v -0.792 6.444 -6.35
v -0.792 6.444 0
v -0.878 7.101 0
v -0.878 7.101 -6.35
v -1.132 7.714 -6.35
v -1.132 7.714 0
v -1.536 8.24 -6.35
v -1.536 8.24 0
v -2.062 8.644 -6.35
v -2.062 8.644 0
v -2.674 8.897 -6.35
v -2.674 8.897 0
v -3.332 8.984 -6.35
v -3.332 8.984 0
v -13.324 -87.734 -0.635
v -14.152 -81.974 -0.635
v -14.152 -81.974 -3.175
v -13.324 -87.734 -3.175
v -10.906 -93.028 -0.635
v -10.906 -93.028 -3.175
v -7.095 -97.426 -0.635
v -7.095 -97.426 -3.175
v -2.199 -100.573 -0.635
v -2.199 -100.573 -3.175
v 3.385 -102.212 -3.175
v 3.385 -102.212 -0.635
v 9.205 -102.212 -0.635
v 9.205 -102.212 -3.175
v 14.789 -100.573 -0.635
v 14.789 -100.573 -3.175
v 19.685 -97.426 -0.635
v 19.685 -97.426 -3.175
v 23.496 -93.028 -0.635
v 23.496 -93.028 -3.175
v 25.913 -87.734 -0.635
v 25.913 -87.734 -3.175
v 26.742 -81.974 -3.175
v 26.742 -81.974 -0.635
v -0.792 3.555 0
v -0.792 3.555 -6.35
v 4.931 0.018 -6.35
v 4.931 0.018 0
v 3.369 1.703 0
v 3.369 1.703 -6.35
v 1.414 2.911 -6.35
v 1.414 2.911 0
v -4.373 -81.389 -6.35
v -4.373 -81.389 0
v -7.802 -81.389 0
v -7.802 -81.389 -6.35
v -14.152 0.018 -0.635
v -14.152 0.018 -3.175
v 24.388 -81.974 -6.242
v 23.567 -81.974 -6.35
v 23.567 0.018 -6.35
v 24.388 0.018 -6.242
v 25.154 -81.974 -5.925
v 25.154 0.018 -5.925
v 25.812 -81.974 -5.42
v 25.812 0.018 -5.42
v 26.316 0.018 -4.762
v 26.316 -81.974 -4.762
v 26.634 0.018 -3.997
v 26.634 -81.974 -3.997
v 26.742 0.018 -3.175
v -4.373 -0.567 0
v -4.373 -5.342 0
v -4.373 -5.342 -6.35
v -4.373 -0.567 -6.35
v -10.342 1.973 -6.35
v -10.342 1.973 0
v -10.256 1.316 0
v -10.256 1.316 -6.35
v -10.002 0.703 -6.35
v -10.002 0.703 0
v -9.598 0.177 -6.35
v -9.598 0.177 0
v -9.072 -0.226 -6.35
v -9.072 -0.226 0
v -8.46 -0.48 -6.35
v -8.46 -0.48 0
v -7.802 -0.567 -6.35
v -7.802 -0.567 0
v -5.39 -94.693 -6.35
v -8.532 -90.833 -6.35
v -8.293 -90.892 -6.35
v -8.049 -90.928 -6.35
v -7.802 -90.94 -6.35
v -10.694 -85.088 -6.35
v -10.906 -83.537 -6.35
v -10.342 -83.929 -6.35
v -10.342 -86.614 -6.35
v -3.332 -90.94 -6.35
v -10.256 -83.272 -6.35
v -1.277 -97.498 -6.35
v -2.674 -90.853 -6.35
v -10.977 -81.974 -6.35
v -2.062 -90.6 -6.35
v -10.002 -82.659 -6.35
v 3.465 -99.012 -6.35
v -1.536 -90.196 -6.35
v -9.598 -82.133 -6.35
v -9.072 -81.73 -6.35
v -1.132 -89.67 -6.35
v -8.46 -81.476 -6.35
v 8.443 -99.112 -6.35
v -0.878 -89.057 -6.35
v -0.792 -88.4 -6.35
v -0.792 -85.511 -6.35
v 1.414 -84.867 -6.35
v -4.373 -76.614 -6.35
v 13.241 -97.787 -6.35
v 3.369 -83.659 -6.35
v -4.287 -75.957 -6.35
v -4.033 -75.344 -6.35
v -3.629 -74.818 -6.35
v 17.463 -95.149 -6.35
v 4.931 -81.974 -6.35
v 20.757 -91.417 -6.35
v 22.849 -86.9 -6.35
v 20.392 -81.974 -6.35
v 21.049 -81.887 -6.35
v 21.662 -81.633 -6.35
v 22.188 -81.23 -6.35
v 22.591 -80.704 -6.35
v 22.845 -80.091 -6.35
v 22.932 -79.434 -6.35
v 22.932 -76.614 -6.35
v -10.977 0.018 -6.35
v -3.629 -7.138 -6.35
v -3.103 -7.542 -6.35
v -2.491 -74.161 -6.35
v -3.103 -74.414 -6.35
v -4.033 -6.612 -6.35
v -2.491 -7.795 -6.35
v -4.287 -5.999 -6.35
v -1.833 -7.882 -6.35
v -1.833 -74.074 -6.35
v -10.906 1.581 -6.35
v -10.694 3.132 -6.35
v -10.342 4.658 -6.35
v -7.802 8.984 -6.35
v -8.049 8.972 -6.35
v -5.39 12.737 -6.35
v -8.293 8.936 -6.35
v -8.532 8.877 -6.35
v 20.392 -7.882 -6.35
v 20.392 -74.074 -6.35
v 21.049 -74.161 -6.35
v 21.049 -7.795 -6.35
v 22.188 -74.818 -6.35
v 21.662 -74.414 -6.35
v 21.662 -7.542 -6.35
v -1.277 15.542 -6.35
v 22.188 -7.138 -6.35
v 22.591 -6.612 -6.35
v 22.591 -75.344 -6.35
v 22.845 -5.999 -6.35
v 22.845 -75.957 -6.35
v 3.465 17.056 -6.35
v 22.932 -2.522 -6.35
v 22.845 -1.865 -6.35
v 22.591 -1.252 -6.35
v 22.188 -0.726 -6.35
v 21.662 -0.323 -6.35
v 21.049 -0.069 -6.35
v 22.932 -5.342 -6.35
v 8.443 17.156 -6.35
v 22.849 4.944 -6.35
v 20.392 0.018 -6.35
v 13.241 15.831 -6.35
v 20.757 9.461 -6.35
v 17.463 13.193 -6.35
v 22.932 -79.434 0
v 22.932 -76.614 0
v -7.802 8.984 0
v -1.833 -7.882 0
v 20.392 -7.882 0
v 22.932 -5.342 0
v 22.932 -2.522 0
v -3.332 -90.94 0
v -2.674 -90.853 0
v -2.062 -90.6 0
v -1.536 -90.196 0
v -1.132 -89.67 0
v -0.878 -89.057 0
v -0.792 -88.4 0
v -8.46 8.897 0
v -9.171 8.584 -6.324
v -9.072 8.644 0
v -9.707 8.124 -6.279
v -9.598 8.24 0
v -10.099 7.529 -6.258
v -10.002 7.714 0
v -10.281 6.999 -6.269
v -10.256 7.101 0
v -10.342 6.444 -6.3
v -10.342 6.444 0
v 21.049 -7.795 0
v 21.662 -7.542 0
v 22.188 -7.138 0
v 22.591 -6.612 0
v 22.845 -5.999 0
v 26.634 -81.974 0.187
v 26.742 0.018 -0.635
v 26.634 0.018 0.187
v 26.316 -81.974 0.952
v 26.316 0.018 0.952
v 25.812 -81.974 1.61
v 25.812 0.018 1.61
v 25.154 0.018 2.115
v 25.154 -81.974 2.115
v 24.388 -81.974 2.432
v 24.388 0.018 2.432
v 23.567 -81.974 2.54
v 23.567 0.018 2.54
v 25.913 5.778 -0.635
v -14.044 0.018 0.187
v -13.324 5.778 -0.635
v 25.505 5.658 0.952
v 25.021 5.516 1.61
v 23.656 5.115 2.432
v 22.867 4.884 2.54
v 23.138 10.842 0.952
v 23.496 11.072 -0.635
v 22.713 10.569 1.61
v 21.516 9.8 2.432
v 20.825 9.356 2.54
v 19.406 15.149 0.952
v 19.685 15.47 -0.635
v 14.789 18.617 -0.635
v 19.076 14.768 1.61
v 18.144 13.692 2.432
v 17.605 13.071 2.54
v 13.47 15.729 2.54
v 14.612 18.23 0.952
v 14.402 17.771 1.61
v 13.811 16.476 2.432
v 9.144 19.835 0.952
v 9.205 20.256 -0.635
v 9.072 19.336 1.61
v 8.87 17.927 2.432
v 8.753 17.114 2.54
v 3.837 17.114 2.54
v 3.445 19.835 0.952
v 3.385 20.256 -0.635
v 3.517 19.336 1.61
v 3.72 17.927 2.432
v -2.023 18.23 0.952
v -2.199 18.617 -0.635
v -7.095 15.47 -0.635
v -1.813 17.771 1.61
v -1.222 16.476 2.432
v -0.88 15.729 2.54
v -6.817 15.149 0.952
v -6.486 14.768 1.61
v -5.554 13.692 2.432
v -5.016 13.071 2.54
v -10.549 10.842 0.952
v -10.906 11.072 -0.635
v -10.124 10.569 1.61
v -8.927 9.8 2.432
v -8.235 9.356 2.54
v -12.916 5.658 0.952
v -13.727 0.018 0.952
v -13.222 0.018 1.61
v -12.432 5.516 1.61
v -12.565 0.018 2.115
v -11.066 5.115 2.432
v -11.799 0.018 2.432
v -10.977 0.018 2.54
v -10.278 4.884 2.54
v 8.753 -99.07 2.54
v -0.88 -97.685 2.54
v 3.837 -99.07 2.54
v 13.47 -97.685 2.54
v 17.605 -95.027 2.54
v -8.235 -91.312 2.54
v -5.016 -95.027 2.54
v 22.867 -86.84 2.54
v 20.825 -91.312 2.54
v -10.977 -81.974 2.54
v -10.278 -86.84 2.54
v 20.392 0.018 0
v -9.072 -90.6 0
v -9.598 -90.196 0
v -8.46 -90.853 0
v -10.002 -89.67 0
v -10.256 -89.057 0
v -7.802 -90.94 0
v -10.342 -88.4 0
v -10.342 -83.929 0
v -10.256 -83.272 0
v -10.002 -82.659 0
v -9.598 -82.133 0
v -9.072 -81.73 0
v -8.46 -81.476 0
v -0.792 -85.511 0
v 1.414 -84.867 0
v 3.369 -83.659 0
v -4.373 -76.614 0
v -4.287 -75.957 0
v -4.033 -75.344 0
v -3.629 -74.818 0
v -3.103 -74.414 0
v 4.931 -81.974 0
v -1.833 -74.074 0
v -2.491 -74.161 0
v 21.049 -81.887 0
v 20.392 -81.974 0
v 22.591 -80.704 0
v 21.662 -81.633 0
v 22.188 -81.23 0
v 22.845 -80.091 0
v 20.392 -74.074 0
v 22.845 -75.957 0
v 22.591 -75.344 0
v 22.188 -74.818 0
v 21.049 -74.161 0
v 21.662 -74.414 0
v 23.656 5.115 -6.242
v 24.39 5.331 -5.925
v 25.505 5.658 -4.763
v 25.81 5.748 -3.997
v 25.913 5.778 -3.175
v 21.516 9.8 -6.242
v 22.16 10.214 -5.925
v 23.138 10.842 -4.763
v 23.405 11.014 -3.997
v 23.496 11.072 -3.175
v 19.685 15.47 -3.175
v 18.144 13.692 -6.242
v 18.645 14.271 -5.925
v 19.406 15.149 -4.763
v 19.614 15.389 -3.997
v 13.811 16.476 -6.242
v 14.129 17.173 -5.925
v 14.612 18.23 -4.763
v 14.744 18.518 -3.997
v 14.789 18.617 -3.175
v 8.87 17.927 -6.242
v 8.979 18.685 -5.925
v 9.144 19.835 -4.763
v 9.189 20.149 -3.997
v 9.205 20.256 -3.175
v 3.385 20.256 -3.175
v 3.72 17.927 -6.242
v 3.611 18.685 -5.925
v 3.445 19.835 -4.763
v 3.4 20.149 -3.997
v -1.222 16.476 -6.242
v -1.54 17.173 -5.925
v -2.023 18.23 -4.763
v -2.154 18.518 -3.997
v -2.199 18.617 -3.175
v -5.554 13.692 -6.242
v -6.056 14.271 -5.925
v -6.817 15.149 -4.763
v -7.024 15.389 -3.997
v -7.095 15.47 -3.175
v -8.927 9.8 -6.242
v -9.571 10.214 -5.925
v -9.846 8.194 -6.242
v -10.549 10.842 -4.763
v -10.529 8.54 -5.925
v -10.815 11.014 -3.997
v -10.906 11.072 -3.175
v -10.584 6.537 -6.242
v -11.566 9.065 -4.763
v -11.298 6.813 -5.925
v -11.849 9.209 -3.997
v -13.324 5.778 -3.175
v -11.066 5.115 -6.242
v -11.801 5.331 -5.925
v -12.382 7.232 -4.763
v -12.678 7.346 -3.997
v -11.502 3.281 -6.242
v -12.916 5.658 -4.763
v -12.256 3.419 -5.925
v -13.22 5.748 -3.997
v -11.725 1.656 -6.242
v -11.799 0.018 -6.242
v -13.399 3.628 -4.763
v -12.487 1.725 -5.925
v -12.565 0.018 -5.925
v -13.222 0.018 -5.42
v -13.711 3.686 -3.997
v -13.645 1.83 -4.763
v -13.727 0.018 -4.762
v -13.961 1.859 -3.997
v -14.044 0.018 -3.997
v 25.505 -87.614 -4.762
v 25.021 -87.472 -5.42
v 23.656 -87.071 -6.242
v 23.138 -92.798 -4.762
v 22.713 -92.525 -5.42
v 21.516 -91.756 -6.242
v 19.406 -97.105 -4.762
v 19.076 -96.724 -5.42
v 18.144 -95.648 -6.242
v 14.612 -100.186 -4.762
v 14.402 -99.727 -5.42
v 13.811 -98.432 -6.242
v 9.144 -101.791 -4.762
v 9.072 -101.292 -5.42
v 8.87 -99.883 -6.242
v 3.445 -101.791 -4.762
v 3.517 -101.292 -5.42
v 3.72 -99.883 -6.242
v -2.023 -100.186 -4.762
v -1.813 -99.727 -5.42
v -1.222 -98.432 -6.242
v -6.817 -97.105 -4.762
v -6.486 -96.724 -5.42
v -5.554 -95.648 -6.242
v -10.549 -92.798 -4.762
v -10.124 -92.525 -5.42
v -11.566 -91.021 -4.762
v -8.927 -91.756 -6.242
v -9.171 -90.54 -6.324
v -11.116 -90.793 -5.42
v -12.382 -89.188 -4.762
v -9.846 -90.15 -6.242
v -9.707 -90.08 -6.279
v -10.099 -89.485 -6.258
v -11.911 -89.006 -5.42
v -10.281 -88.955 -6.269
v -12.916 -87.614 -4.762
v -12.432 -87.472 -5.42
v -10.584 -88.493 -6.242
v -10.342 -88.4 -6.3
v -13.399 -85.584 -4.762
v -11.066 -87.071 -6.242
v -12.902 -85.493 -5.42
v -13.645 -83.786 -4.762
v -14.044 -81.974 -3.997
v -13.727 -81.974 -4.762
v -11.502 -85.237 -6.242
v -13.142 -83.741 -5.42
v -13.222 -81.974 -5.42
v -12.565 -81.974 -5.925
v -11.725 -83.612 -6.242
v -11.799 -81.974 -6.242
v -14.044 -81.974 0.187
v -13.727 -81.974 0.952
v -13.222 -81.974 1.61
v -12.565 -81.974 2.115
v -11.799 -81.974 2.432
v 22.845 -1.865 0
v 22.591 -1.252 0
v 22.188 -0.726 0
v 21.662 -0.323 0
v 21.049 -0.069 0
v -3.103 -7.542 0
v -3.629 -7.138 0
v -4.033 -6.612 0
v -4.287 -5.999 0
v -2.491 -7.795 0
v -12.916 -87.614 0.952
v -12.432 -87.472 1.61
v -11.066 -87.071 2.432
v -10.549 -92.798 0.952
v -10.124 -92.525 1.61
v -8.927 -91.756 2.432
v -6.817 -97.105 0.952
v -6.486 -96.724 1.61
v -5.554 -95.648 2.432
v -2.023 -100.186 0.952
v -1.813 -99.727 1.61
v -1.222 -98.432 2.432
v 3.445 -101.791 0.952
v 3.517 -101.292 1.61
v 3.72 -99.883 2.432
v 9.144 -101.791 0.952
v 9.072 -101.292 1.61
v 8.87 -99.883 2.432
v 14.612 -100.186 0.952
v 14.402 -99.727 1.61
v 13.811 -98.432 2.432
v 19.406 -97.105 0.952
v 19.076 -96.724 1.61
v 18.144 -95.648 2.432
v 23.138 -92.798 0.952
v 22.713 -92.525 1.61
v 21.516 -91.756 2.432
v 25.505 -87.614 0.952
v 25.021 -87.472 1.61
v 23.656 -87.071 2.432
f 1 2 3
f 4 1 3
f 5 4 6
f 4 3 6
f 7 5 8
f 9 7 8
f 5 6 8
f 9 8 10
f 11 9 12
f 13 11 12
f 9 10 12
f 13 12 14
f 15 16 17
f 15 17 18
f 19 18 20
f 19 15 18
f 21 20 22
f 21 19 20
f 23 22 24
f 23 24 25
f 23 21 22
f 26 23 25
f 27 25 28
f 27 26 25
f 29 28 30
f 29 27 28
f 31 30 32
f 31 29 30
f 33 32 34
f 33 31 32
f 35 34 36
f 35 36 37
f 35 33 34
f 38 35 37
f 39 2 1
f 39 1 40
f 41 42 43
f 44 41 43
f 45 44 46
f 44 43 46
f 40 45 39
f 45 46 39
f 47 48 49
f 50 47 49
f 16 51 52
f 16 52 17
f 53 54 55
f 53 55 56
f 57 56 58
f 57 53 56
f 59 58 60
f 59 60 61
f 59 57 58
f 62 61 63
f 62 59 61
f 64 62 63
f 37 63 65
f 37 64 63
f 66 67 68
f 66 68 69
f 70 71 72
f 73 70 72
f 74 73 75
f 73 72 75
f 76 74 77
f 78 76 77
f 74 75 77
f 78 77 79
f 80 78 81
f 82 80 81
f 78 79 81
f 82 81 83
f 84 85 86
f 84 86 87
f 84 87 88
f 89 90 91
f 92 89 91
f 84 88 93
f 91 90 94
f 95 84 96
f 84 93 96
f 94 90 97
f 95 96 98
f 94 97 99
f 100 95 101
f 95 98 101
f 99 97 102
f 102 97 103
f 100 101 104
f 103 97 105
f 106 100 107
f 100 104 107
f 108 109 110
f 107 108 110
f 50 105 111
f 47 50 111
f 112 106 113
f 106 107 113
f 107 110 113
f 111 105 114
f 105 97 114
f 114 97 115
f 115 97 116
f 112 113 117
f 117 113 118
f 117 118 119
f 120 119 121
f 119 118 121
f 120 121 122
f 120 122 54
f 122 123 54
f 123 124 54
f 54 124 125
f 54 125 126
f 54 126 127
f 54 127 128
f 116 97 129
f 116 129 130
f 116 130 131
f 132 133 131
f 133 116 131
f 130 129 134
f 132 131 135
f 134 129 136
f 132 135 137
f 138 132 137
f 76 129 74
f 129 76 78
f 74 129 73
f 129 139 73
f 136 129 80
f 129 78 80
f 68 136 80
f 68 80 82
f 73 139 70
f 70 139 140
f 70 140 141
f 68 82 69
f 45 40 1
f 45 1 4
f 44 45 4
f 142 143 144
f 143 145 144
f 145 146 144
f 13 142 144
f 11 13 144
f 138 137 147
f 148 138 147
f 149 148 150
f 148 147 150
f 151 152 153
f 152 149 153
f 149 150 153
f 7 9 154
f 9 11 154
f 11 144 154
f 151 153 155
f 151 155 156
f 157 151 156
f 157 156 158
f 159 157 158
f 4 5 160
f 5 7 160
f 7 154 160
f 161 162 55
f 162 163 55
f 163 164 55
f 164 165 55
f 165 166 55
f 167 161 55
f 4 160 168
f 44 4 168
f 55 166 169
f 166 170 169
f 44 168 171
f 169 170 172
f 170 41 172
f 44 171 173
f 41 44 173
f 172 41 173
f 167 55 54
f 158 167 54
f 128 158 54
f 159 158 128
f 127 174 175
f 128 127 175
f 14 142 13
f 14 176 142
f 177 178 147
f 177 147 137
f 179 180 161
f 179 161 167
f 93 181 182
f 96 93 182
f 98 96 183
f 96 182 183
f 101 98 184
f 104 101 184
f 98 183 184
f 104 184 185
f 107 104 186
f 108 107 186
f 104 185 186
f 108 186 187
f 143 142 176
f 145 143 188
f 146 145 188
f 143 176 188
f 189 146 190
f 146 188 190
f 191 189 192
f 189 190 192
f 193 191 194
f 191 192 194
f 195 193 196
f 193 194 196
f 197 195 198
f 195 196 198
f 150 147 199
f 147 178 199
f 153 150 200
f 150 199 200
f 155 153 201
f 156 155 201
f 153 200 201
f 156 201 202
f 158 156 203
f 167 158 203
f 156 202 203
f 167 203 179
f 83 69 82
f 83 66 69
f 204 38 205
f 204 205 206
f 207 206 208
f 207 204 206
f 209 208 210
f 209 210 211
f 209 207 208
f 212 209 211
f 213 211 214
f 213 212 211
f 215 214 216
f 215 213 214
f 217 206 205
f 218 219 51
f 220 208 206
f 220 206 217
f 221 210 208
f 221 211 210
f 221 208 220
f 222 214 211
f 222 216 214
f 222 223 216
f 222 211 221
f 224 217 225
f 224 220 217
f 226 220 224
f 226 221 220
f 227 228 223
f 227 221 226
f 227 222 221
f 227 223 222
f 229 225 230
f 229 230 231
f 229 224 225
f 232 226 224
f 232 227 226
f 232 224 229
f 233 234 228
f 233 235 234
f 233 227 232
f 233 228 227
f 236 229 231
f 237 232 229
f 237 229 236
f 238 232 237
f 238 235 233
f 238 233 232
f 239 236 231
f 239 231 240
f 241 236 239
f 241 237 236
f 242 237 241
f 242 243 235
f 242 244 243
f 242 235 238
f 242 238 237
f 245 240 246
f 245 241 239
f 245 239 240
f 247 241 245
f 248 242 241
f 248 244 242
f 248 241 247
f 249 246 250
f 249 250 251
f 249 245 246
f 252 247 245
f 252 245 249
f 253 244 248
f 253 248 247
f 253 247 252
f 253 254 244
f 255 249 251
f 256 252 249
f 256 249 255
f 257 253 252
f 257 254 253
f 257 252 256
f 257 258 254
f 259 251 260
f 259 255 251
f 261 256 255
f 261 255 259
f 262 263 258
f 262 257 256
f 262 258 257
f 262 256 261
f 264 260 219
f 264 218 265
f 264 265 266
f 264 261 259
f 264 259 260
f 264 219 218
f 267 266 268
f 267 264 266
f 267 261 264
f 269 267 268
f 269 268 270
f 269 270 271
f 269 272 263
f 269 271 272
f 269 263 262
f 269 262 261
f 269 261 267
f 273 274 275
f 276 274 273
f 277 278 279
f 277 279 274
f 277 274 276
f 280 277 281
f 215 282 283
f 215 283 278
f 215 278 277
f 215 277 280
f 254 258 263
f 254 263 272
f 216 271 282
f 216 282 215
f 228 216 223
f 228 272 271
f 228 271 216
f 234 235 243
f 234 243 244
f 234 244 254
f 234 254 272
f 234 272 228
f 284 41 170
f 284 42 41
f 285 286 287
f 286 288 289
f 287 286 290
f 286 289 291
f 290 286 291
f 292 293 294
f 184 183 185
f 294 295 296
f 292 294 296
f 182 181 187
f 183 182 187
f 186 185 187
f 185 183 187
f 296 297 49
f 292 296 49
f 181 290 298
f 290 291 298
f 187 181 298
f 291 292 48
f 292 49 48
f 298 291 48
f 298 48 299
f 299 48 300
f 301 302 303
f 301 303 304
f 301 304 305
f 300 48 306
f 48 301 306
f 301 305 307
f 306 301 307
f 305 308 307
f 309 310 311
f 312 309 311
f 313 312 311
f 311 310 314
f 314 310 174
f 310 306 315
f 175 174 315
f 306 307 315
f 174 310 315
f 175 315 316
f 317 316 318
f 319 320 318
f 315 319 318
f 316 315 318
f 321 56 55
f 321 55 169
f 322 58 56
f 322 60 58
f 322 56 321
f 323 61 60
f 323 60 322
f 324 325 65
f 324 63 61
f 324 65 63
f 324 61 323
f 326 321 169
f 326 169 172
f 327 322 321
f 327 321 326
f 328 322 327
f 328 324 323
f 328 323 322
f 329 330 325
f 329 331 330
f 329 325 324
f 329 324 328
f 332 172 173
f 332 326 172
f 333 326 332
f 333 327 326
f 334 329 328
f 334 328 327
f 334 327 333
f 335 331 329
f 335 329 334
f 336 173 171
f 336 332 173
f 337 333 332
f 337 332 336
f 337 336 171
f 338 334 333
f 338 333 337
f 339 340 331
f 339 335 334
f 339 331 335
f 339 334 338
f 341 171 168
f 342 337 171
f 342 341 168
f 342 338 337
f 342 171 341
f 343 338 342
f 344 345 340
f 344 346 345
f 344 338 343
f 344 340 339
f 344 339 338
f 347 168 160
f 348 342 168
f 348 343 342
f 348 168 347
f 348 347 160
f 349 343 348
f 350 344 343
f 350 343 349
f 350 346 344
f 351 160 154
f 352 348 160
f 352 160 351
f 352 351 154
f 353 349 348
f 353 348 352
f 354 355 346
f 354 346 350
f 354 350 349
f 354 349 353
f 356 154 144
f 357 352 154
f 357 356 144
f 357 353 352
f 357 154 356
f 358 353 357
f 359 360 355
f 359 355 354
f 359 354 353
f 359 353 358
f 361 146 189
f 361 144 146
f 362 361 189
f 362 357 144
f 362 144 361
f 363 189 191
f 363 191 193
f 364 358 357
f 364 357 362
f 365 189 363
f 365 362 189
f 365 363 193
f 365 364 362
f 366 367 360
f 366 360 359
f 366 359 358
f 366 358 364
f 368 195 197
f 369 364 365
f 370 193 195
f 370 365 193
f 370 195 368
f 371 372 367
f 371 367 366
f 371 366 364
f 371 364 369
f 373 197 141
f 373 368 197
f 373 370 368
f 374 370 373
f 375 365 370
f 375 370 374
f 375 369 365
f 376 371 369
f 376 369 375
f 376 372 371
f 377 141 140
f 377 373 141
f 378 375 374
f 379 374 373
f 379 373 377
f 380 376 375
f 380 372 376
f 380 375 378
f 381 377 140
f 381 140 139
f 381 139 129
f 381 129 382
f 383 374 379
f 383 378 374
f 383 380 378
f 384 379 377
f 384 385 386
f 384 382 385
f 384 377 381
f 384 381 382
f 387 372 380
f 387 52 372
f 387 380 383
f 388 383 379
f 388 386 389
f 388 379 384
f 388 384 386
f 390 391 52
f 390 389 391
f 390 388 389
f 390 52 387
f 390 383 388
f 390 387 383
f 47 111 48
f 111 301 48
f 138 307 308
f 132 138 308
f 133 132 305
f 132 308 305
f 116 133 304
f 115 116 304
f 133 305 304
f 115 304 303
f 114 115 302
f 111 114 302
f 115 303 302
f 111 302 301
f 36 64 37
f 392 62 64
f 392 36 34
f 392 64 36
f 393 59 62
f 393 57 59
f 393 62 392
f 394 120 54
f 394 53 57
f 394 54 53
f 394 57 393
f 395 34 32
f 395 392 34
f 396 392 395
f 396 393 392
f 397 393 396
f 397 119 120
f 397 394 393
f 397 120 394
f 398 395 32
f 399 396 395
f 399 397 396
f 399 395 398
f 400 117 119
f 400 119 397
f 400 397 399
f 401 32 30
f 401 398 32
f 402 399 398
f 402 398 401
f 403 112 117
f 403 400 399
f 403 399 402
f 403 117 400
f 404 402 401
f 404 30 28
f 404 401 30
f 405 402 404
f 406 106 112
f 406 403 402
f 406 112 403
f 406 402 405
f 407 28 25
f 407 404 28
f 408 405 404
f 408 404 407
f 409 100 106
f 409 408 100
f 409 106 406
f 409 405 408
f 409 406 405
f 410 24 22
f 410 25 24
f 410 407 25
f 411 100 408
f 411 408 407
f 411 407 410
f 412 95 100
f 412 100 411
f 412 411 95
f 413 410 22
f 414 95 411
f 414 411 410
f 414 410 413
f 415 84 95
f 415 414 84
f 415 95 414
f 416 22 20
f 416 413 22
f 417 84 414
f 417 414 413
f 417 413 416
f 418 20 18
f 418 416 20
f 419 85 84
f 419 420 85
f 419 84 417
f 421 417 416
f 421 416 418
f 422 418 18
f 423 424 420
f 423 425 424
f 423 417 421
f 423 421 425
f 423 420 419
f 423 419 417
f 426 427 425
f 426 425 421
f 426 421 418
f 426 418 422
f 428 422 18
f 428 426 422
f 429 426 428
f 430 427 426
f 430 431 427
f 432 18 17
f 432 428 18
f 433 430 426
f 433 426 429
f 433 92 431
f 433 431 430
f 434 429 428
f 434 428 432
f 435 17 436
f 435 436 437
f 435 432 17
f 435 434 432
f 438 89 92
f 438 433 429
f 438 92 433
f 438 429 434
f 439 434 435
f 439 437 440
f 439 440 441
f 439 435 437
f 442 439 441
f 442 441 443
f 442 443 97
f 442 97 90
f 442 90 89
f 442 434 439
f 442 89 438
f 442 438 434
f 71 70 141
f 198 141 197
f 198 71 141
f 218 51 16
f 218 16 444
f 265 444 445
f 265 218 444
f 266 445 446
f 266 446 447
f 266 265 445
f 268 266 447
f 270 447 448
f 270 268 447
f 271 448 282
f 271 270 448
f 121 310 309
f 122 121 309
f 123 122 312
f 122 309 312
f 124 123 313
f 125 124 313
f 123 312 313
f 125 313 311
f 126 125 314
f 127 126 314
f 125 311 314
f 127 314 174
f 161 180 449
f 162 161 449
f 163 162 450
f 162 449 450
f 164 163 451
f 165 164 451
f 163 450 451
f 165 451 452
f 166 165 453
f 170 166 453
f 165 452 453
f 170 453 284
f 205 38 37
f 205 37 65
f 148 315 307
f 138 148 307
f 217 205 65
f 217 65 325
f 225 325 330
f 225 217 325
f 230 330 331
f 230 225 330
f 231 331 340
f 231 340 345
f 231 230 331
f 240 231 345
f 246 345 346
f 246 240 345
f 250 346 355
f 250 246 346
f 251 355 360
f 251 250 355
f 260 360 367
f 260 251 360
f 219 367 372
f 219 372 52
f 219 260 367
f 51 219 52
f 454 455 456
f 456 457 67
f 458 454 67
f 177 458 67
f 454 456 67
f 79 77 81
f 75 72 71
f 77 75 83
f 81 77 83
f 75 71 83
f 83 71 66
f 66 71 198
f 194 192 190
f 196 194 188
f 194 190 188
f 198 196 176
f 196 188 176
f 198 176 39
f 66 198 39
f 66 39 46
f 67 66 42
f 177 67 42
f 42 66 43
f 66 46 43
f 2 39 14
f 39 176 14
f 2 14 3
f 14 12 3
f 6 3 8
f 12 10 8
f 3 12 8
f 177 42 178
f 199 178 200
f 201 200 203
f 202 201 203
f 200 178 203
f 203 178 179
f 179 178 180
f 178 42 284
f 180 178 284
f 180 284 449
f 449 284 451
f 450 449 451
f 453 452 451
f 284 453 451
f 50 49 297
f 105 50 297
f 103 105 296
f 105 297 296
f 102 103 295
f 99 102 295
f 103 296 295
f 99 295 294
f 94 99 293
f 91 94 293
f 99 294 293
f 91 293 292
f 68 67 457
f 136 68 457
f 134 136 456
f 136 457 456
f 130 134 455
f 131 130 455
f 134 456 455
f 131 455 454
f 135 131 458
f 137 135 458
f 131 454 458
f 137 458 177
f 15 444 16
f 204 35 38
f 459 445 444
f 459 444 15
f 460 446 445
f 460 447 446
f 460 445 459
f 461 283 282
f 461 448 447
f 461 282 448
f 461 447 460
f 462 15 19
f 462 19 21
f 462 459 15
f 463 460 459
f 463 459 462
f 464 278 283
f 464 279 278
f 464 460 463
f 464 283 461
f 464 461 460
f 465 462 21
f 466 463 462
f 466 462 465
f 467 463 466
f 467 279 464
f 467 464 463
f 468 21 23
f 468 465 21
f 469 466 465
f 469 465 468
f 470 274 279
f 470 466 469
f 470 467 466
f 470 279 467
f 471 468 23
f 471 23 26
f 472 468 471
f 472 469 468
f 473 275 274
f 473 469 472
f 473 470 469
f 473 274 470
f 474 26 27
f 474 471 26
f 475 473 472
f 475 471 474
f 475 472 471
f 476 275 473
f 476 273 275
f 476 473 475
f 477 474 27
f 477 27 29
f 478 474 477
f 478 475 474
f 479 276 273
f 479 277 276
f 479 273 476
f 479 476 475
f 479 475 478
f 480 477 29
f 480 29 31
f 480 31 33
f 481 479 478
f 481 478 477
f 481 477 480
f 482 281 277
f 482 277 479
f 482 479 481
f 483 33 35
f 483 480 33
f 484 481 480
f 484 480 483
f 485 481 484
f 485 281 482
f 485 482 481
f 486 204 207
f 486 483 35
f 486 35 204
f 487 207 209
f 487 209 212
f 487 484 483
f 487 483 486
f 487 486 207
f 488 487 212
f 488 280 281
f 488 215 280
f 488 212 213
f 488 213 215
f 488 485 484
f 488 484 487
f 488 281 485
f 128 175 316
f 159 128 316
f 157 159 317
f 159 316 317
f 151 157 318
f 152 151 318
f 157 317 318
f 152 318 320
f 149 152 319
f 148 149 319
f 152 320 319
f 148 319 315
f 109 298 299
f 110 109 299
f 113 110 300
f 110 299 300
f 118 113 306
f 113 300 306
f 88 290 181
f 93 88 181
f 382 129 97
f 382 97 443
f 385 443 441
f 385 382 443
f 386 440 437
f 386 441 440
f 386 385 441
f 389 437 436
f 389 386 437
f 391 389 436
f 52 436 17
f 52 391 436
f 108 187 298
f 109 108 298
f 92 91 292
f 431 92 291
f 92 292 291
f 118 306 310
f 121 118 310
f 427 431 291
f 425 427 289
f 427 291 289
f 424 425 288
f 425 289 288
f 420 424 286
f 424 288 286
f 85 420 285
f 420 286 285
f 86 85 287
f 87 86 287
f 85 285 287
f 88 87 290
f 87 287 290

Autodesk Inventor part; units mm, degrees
ref_plane "YZ Plane" through (0, 0, 0) normal (1, 0, 0) x (0, 1, 0)
ref_plane "XZ Plane" through (0, 0, 0) normal (0, 1, 0) x (-1, 0, 0)
ref_plane "XY Plane" through (0, 0, 0) normal (0, 0, 1) x (1, 0, 0)
ref_plane "Work Plane1" through (0, 0, 0) normal (0, 0, 1) x (1, 0, 0)
sketch "Sketch1" plane through (0, 0, 0) normal (0, 0, 1) x (1, 0, 0)
  arc A0 (20.3917, -80.7036) -> (21.6617, -79.4336) centre (20.3917, -79.4336) ccw projected
  line L0 (21.6617, -79.4336) -> (21.6617, -76.6142) projected
  arc A1 (21.6617, -76.6142) -> (20.3917, -75.3442) centre (20.3917, -76.6142) ccw projected
  line L1 (20.3917, -75.3442) -> (-1.8333, -75.3442) projected
  arc A2 (-1.8333, -75.3442) -> (-3.1033, -76.6142) centre (-1.8333, -76.6142) ccw projected
  line L2 (-3.1033, -76.6142) -> (-3.1033, -81.3894) projected
  arc A3 (-4.3733, -82.6594) -> (-3.1033, -81.3894) centre (-4.3733, -81.3894) ccw projected
  line L3 (-4.3733, -82.6594) -> (-7.8023, -82.6594) projected
  arc A4 (-7.8023, -82.6594) -> (-9.0723, -83.9294) centre (-7.8023, -83.9294) ccw projected
  line L4 (-9.0723, -83.9294) -> (-9.0723, -88.3998) projected
  arc A5 (-9.0723, -88.3998) -> (-7.8023, -89.6698) centre (-7.8023, -88.3998) ccw projected
  line L5 (-7.8023, -89.6698) -> (-3.3319, -89.6698) projected
  arc A6 (-3.3319, -89.6698) -> (-2.0619, -88.3998) centre (-3.3319, -88.3998) ccw projected
  line L6 (-2.0619, -88.3998) -> (-2.0619, -85.5109) projected
  arc A7 (-0.9806, -84.255) -> (-2.0619, -85.5109) centre (-0.7919, -85.5109) ccw projected
  arc A8 (-0.9806, -84.255) -> (4.2373, -80.7036) centre (-2.0619, -77.0575) ccw projected
  line L7 (4.2373, -80.7036) -> (20.3917, -80.7036) projected
  arc A9 (21.6617, -2.5224) -> (20.3917, -1.2524) centre (20.3917, -2.5224) ccw projected
  line L8 (4.2373, -1.2524) -> (20.3917, -1.2524) projected
  arc A10 (4.2373, -1.2524) -> (-0.9806, 2.299) centre (-2.0619, -4.8985) ccw projected
  arc A11 (-2.0619, 3.5549) -> (-0.9806, 2.299) centre (-0.7919, 3.5549) ccw projected
  line L9 (-2.0619, 6.4438) -> (-2.0619, 3.5549) projected
  arc A12 (-2.0619, 6.4438) -> (-3.3319, 7.7138) centre (-3.3319, 6.4438) ccw projected
  line L10 (-7.8023, 7.7138) -> (-3.3319, 7.7138) projected
  arc A13 (-7.8023, 7.7138) -> (-9.0723, 6.4438) centre (-7.8023, 6.4438) ccw projected
  line L11 (-9.0723, 1.9734) -> (-9.0723, 6.4438) projected
  arc A14 (-9.0723, 1.9734) -> (-7.8023, 0.7034) centre (-7.8023, 1.9734) ccw projected
  line L12 (-4.3733, 0.7034) -> (-7.8023, 0.7034) projected
  arc A15 (-3.1033, -0.5666) -> (-4.3733, 0.7034) centre (-4.3733, -0.5666) ccw projected
  line L13 (-3.1033, -5.3418) -> (-3.1033, -0.5666) projected
  arc A16 (-3.1033, -5.3418) -> (-1.8333, -6.6118) centre (-1.8333, -5.3418) ccw projected
  line L14 (20.3917, -6.6118) -> (-1.8333, -6.6118) projected
  arc A17 (20.3917, -6.6118) -> (21.6617, -5.3418) centre (20.3917, -5.3418) ccw projected
  line L15 (21.6617, -2.5224) -> (21.6617, -5.3418) projected
  arc A18 (20.3917, -81.9736) -> (22.9317, -79.4336) centre (20.3917, -79.4336) ccw
  line L16 (22.9317, -79.4336) -> (22.9317, -76.6142)
  arc A19 (22.9317, -76.6142) -> (20.3917, -74.0742) centre (20.3917, -76.6142) ccw
  line L17 (20.3917, -74.0742) -> (-1.8333, -74.0742)
  arc A20 (-1.8333, -74.0742) -> (-4.3733, -76.6142) centre (-1.8333, -76.6142) ccw
  line L18 (-4.3733, -76.6142) -> (-4.3733, -81.3894)
  line L19 (-4.3733, -81.3894) -> (-7.8023, -81.3894)
  arc A21 (-7.8023, -81.3894) -> (-10.3423, -83.9294) centre (-7.8023, -83.9294) ccw
  line L20 (-10.3423, -83.9294) -> (-10.3423, -88.3998)
  arc A22 (-10.3423, -88.3998) -> (-7.8023, -90.9398) centre (-7.8023, -88.3998) ccw
  line L21 (-7.8023, -90.9398) -> (-3.3319, -90.9398)
  arc A23 (-3.3319, -90.9398) -> (-0.7919, -88.3998) centre (-3.3319, -88.3998) ccw
  line L22 (-0.7919, -88.3998) -> (-0.7919, -85.5109)
  arc A24 (-0.7919, -85.5109) -> (4.9314, -81.9736) centre (-2.0619, -77.0575) ccw
  line L23 (4.9314, -81.9736) -> (20.3917, -81.9736)
  arc A25 (-4.3733, -5.3418) -> (-1.8333, -7.8818) centre (-1.8333, -5.3418) ccw
  line L24 (-4.3733, -5.3418) -> (-4.3733, -0.5666)
  line L25 (-4.3733, -0.5666) -> (-7.8023, -0.5666)
  arc A26 (-10.3423, 1.9734) -> (-7.8023, -0.5666) centre (-7.8023, 1.9734) ccw
  line L26 (-10.3423, 1.9734) -> (-10.3423, 6.4438)
  arc A27 (-7.8023, 8.9838) -> (-10.3423, 6.4438) centre (-7.8023, 6.4438) ccw
  line L27 (-7.8023, 8.9838) -> (-3.3319, 8.9838)
  arc A28 (-0.7919, 6.4438) -> (-3.3319, 8.9838) centre (-3.3319, 6.4438) ccw
  line L28 (-0.7919, 6.4438) -> (-0.7919, 3.5549)
  arc A29 (4.9314, 0.0176) -> (-0.7919, 3.5549) centre (-2.0619, -4.8985) ccw
  line L29 (4.9314, 0.0176) -> (20.3917, 0.0176)
  arc A30 (22.9317, -2.5224) -> (20.3917, 0.0176) centre (20.3917, -2.5224) ccw
  line L30 (22.9317, -2.5224) -> (22.9317, -5.3418)
  arc A31 (20.3917, -7.8818) -> (22.9317, -5.3418) centre (20.3917, -5.3418) ccw
  line L31 (20.3917, -7.8818) -> (-1.8333, -7.8818)
  line L32 (6.2947, -102.4206) -> (6.2947, 20.4646) construction
  line L33 (26.7417, -81.9736) -> (26.7417, 0.0176)
  line L34 (-14.1523, 0.0176) -> (-14.1523, -81.9736)
  arc A32 (-14.1523, -81.9736) -> (26.7417, -81.9736) centre (6.2947, -81.9736) ccw
  arc A33 (26.7417, 0.0176) -> (-14.1523, 0.0176) centre (6.2947, 0.0176) ccw
  point P0 (0, 0)
  point P1 (6.2947, -40.978)
  dimension "d0" = 1.27
  dimension "d1" = 1.27
  dimension "d2" = 3.81
  dimension "d3" = 3.81
  dimension "d4" = 33.0962
  dimension "d5" = 33.0962
extrude "Extrusion1" add sketch "Sketch1" against normal blind 6.35 contours A32 L34 A33 L33
sketch "Sketch2" plane through (0, 0, 0) normal (0, 0, 1) x (1, 0, 0)
  line L0 (20.3917, -7.8818) -> (-1.8333, -7.8818) projected
  arc A0 (-4.3733, -5.3418) -> (-1.8333, -7.8818) centre (-1.8333, -5.3418) ccw projected
  line L1 (-4.3733, -5.3418) -> (-4.3733, -0.5666) projected
  line L2 (-4.3733, -0.5666) -> (-7.8023, -0.5666) projected
  arc A1 (-10.3423, 1.9734) -> (-7.8023, -0.5666) centre (-7.8023, 1.9734) ccw projected
  line L3 (-10.3423, 1.9734) -> (-10.3423, 6.4438) projected
  arc A2 (-7.8023, 8.9838) -> (-10.3423, 6.4438) centre (-7.8023, 6.4438) ccw projected
  line L4 (-7.8023, 8.9838) -> (-3.3319, 8.9838) projected
  arc A3 (-0.7919, 6.4438) -> (-3.3319, 8.9838) centre (-3.3319, 6.4438) ccw projected
  line L5 (-0.7919, 6.4438) -> (-0.7919, 3.5549) projected
  arc A4 (4.9314, 0.0176) -> (-0.7919, 3.5549) centre (-2.0619, -4.8985) ccw projected
  line L6 (4.9314, 0.0176) -> (20.3917, 0.0176) projected
  arc A5 (22.9317, -2.5224) -> (20.3917, 0.0176) centre (20.3917, -2.5224) ccw projected
  line L7 (22.9317, -2.5224) -> (22.9317, -5.3418) projected
  arc A6 (20.3917, -7.8818) -> (22.9317, -5.3418) centre (20.3917, -5.3418) ccw projected
  line L8 (22.9317, -76.6142) -> (22.9317, -79.4336) projected
  arc A7 (20.3917, -81.9736) -> (22.9317, -79.4336) centre (20.3917, -79.4336) ccw projected
  line L9 (20.3917, -81.9736) -> (4.9314, -81.9736) projected
  arc A8 (-0.7919, -85.5109) -> (4.9314, -81.9736) centre (-2.0619, -77.0575) ccw projected
  line L10 (-0.7919, -85.5109) -> (-0.7919, -88.3998) projected
  arc A9 (-3.3319, -90.9398) -> (-0.7919, -88.3998) centre (-3.3319, -88.3998) ccw projected
  line L11 (-3.3319, -90.9398) -> (-7.8023, -90.9398) projected
  arc A10 (-10.3423, -88.3998) -> (-7.8023, -90.9398) centre (-7.8023, -88.3998) ccw projected
  line L12 (-10.3423, -88.3998) -> (-10.3423, -83.9294) projected
  arc A11 (-7.8023, -81.3894) -> (-10.3423, -83.9294) centre (-7.8023, -83.9294) ccw projected
  line L13 (-7.8023, -81.3894) -> (-4.3733, -81.3894) projected
  line L14 (-4.3733, -81.3894) -> (-4.3733, -76.6142) projected
  arc A12 (-1.8333, -74.0742) -> (-4.3733, -76.6142) centre (-1.8333, -76.6142) ccw projected
  line L15 (-1.8333, -74.0742) -> (20.3917, -74.0742) projected
  arc A13 (22.9317, -76.6142) -> (20.3917, -74.0742) centre (20.3917, -76.6142) ccw projected
  line L16 (26.7417, -81.9736) -> (26.7417, 0.0176) projected
  arc A14 (26.7417, 0.0176) -> (-14.1523, 0.0176) centre (6.2947, 0.0176) ccw projected
  line L17 (-14.1523, 0.0176) -> (-14.1523, -81.9736) projected
  arc A15 (-14.1523, -81.9736) -> (26.7417, -81.9736) centre (6.2947, -81.9736) ccw projected
  point P0 (0, 0)
extrude "Extrusion2" add sketch "Sketch2" along normal blind 2.54 contours L0 A0 L1 L2 A1 L3 A2 L4 A3 L5 A4 L6 A5 L7 A6 | L8 A7 L9 A8 L10 A9 L11 A10 L12 A11 L13 L14 A12 L15 A13 | A15 L17 A14 L16
fillet "Fillet1" radius 3.175 8 edges at (-14.1523, -40.978, 2.54) (6.2947, -102.4206, 2.54) (26.7417, -40.978, 2.54) (6.2947, 20.4646, 2.54) (-14.1523, -40.978, -6.35) (6.2947, 20.4646, -6.35) (26.7417, -40.978, -6.35) (6.2947, -102.4206, -6.35)
equation "\"d1\" = d0"
equation "\"d3\" = d2"
equation "\"d4\" = d5"
properties part number "cap"
